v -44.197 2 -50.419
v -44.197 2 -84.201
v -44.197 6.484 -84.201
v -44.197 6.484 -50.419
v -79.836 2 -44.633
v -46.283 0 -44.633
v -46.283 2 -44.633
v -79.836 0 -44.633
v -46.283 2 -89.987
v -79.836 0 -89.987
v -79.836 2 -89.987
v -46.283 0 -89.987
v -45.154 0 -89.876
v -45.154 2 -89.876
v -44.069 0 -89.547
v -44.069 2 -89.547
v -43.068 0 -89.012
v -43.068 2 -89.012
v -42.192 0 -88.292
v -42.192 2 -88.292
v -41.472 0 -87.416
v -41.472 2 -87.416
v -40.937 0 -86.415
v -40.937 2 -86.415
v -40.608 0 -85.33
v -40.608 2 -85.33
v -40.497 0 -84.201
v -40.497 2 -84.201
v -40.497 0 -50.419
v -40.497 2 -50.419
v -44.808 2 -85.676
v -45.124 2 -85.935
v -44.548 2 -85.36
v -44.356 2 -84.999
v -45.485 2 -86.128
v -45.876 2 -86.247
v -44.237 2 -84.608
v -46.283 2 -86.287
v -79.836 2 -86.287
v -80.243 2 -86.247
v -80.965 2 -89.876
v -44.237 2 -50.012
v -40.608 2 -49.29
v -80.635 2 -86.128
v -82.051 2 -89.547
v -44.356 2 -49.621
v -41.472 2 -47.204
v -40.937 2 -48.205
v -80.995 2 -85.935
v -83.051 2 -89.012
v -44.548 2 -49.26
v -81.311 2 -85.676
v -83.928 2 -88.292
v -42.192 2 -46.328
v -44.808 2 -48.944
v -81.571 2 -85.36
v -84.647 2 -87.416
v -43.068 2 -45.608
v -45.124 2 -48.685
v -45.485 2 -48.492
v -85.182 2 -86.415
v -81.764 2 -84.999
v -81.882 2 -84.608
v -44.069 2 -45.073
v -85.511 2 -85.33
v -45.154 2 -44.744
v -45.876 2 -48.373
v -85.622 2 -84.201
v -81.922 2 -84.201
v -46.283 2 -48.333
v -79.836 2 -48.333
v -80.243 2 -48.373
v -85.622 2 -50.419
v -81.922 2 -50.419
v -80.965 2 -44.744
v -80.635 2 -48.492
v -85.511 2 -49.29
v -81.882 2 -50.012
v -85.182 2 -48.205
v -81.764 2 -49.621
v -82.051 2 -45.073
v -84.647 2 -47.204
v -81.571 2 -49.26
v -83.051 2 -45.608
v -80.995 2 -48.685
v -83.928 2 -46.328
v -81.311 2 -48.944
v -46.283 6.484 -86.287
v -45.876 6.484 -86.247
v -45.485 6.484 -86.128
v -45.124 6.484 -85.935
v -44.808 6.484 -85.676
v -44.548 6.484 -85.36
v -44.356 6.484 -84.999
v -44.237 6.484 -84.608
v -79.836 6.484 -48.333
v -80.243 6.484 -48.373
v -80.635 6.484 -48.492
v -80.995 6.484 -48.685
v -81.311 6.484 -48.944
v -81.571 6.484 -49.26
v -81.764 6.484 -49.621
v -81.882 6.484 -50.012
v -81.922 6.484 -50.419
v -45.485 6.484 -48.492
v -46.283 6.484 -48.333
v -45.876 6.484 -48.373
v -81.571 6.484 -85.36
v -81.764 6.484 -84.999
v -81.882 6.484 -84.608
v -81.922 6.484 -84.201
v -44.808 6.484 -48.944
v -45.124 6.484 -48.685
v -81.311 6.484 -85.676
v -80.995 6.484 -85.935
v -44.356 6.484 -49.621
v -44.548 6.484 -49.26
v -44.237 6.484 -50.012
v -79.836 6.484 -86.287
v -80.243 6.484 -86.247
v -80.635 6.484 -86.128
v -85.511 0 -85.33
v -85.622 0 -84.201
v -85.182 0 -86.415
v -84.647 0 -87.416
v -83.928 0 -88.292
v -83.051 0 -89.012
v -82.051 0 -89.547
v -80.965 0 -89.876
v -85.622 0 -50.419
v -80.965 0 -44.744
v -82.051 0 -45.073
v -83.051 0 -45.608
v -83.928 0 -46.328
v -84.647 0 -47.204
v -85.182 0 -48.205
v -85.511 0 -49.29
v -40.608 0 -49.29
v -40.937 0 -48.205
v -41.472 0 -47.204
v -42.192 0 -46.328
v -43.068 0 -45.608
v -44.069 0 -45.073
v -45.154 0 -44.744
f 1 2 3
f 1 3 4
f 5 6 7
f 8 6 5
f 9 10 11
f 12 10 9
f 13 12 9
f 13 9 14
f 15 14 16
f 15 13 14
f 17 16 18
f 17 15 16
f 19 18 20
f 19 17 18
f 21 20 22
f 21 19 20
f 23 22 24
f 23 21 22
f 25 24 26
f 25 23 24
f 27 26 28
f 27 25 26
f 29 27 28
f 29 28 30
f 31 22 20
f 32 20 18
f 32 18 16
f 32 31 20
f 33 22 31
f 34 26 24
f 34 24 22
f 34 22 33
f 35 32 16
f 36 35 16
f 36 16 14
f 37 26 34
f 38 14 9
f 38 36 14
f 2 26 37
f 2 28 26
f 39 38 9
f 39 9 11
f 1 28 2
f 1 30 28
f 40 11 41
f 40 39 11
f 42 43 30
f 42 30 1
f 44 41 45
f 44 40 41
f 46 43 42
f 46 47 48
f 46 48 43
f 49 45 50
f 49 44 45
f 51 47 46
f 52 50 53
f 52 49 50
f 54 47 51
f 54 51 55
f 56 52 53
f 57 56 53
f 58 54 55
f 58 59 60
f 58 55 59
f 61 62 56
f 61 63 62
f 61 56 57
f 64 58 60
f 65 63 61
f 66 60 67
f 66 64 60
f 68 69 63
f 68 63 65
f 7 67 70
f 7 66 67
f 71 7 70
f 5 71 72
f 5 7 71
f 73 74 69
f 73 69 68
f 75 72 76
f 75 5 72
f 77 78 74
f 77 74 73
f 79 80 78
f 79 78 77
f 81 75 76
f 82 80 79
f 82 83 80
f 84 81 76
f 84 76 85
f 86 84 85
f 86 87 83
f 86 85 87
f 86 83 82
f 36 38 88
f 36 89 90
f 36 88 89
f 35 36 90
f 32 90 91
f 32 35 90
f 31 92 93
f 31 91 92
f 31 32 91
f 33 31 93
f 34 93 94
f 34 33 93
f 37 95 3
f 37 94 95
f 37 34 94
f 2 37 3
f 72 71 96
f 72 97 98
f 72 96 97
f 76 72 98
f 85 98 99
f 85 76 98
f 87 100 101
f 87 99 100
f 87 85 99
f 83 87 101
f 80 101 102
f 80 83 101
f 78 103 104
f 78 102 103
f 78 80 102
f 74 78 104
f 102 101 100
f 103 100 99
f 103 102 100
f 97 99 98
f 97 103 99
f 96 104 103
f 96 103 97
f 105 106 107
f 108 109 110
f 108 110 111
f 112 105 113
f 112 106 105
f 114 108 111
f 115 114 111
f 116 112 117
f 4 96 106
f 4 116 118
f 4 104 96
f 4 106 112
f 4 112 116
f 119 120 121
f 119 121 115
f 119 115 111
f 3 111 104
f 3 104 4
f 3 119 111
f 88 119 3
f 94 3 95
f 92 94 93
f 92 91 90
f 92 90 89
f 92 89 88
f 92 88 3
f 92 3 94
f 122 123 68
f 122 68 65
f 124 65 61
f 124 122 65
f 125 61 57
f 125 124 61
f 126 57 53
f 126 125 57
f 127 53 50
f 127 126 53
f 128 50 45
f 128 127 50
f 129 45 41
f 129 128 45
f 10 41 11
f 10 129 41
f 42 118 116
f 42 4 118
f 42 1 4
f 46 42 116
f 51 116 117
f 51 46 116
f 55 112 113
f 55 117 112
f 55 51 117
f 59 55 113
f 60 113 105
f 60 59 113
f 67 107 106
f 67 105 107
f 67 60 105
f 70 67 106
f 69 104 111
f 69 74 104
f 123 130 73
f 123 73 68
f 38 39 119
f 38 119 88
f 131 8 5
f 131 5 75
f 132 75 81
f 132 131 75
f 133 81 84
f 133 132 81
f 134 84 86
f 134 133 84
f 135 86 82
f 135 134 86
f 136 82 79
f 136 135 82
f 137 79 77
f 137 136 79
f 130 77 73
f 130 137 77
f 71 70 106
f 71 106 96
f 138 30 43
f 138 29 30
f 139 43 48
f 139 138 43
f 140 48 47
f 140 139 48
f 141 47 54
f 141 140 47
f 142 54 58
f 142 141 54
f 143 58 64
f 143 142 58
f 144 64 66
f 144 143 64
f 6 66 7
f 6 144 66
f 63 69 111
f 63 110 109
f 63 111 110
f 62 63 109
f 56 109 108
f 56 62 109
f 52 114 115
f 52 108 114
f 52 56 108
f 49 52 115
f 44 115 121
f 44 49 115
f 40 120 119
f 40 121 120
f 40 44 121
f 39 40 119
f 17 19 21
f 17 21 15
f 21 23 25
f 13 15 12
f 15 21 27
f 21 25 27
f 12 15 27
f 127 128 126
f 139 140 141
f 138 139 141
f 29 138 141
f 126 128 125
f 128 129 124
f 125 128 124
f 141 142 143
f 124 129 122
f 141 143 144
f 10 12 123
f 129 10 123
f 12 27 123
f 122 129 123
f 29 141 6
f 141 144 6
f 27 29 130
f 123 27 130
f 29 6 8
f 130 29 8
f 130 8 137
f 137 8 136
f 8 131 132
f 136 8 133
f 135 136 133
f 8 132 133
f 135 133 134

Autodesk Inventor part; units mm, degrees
ref_plane "YZ Plane" through (0, 0, 0) normal (1, 0, 0) x (0, 1, 0)
ref_plane "XZ Plane" through (0, 0, 0) normal (0, 1, 0) x (-1, 0, 0)
ref_plane "XY Plane" through (0, 0, 0) normal (0, 0, 1) x (1, 0, 0)
sketch "Sketch1" plane through (0, 0, 0) normal (0, 1, 0) x (-1, 0, 0)
  line L0 (63.5, -48.133) -> (79.8363, -48.133)
  line L1 (46.2829, -48.133) -> (63.5, -48.133)
  line L2 (43.9969, -84.201) -> (43.9969, -50.419)
  line L3 (63.5, -86.487) -> (46.2829, -86.487)
  line L4 (79.8363, -86.487) -> (63.5, -86.487)
  line L5 (82.1223, -50.419) -> (82.1223, -84.201)
  arc A0 (79.8363, -86.487) -> (82.1223, -84.201) centre (79.8363, -84.201) ccw
  arc A1 (82.1223, -50.419) -> (79.8363, -48.133) centre (79.8363, -50.419) ccw
  arc A2 (46.2829, -48.133) -> (43.9969, -50.419) centre (46.2829, -50.419) ccw
  arc A3 (43.9969, -84.201) -> (46.2829, -86.487) centre (46.2829, -84.201) ccw
  line L6 (63.5, -89.987) -> (46.2829, -89.987)
  arc A4 (40.4969, -84.201) -> (46.2829, -89.987) centre (46.2829, -84.201) ccw
  line L7 (40.4969, -84.201) -> (40.4969, -50.419)
  arc A5 (46.2829, -44.633) -> (40.4969, -50.419) centre (46.2829, -50.419) ccw
  line L8 (46.2829, -44.633) -> (63.5, -44.633)
  line L9 (63.5, -44.633) -> (79.8363, -44.633)
  arc A6 (85.6223, -50.419) -> (79.8363, -44.633) centre (79.8363, -50.419) ccw
  line L10 (85.6223, -50.419) -> (85.6223, -84.201)
  arc A7 (79.8363, -89.987) -> (85.6223, -84.201) centre (79.8363, -84.201) ccw
  line L11 (79.8363, -89.987) -> (63.5, -89.987)
  dimension "d4" = 3.5
extrude "Extrusion1" add sketch "Sketch1" along normal blind 2 contours L0 A1 L5 A0 L4 L3 A3 L2 A2 L1 | L6 A4 L7 A5 L8 L9 A6 L10 A7 L11
sketch "Sketch3" plane through (0, 2, 0) normal (0, 1, 0) x (1, 0, 0)
  line L0 (-82.1223, 50.419) -> (-82.1223, 84.201) projected
  arc A0 (-82.1223, 50.419) -> (-79.8363, 48.133) centre (-79.8363, 50.419) ccw projected
  line L1 (-63.5, 48.133) -> (-79.8363, 48.133) projected
  line L2 (-46.2829, 48.133) -> (-63.5, 48.133) projected
  arc A1 (-46.2829, 48.133) -> (-43.9969, 50.419) centre (-46.2829, 50.419) ccw projected
  line L3 (-43.9969, 84.201) -> (-43.9969, 50.419) projected
  arc A2 (-43.9969, 84.201) -> (-46.2829, 86.487) centre (-46.2829, 84.201) ccw projected
  line L4 (-63.5, 86.487) -> (-46.2829, 86.487) projected
  line L5 (-79.8363, 86.487) -> (-63.5, 86.487) projected
  arc A3 (-79.8363, 86.487) -> (-82.1223, 84.201) centre (-79.8363, 84.201) ccw projected
  line L6 (-63.5, 86.287) -> (-46.2829, 86.287)
  arc A4 (-44.1969, 84.201) -> (-46.2829, 86.287) centre (-46.2829, 84.201) ccw
  line L7 (-44.1969, 84.201) -> (-44.1969, 50.419)
  arc A5 (-46.2829, 48.333) -> (-44.1969, 50.419) centre (-46.2829, 50.419) ccw
  line L8 (-46.2829, 48.333) -> (-63.5, 48.333)
  line L9 (-63.5, 48.333) -> (-79.8363, 48.333)
  arc A6 (-81.9223, 50.419) -> (-79.8363, 48.333) centre (-79.8363, 50.419) ccw
  line L10 (-81.9223, 50.419) -> (-81.9223, 84.201)
  arc A7 (-79.8363, 86.287) -> (-81.9223, 84.201) centre (-79.8363, 84.201) ccw
  line L11 (-79.8363, 86.287) -> (-63.5, 86.287)
  dimension "d7" = 0.2
extrude "Extrusion3" add sketch "Sketch3" along normal blind 4.484 contours L6 A4 L7 A5 L8 L9 A6 L10 A7 L11
properties part number "Plug"
